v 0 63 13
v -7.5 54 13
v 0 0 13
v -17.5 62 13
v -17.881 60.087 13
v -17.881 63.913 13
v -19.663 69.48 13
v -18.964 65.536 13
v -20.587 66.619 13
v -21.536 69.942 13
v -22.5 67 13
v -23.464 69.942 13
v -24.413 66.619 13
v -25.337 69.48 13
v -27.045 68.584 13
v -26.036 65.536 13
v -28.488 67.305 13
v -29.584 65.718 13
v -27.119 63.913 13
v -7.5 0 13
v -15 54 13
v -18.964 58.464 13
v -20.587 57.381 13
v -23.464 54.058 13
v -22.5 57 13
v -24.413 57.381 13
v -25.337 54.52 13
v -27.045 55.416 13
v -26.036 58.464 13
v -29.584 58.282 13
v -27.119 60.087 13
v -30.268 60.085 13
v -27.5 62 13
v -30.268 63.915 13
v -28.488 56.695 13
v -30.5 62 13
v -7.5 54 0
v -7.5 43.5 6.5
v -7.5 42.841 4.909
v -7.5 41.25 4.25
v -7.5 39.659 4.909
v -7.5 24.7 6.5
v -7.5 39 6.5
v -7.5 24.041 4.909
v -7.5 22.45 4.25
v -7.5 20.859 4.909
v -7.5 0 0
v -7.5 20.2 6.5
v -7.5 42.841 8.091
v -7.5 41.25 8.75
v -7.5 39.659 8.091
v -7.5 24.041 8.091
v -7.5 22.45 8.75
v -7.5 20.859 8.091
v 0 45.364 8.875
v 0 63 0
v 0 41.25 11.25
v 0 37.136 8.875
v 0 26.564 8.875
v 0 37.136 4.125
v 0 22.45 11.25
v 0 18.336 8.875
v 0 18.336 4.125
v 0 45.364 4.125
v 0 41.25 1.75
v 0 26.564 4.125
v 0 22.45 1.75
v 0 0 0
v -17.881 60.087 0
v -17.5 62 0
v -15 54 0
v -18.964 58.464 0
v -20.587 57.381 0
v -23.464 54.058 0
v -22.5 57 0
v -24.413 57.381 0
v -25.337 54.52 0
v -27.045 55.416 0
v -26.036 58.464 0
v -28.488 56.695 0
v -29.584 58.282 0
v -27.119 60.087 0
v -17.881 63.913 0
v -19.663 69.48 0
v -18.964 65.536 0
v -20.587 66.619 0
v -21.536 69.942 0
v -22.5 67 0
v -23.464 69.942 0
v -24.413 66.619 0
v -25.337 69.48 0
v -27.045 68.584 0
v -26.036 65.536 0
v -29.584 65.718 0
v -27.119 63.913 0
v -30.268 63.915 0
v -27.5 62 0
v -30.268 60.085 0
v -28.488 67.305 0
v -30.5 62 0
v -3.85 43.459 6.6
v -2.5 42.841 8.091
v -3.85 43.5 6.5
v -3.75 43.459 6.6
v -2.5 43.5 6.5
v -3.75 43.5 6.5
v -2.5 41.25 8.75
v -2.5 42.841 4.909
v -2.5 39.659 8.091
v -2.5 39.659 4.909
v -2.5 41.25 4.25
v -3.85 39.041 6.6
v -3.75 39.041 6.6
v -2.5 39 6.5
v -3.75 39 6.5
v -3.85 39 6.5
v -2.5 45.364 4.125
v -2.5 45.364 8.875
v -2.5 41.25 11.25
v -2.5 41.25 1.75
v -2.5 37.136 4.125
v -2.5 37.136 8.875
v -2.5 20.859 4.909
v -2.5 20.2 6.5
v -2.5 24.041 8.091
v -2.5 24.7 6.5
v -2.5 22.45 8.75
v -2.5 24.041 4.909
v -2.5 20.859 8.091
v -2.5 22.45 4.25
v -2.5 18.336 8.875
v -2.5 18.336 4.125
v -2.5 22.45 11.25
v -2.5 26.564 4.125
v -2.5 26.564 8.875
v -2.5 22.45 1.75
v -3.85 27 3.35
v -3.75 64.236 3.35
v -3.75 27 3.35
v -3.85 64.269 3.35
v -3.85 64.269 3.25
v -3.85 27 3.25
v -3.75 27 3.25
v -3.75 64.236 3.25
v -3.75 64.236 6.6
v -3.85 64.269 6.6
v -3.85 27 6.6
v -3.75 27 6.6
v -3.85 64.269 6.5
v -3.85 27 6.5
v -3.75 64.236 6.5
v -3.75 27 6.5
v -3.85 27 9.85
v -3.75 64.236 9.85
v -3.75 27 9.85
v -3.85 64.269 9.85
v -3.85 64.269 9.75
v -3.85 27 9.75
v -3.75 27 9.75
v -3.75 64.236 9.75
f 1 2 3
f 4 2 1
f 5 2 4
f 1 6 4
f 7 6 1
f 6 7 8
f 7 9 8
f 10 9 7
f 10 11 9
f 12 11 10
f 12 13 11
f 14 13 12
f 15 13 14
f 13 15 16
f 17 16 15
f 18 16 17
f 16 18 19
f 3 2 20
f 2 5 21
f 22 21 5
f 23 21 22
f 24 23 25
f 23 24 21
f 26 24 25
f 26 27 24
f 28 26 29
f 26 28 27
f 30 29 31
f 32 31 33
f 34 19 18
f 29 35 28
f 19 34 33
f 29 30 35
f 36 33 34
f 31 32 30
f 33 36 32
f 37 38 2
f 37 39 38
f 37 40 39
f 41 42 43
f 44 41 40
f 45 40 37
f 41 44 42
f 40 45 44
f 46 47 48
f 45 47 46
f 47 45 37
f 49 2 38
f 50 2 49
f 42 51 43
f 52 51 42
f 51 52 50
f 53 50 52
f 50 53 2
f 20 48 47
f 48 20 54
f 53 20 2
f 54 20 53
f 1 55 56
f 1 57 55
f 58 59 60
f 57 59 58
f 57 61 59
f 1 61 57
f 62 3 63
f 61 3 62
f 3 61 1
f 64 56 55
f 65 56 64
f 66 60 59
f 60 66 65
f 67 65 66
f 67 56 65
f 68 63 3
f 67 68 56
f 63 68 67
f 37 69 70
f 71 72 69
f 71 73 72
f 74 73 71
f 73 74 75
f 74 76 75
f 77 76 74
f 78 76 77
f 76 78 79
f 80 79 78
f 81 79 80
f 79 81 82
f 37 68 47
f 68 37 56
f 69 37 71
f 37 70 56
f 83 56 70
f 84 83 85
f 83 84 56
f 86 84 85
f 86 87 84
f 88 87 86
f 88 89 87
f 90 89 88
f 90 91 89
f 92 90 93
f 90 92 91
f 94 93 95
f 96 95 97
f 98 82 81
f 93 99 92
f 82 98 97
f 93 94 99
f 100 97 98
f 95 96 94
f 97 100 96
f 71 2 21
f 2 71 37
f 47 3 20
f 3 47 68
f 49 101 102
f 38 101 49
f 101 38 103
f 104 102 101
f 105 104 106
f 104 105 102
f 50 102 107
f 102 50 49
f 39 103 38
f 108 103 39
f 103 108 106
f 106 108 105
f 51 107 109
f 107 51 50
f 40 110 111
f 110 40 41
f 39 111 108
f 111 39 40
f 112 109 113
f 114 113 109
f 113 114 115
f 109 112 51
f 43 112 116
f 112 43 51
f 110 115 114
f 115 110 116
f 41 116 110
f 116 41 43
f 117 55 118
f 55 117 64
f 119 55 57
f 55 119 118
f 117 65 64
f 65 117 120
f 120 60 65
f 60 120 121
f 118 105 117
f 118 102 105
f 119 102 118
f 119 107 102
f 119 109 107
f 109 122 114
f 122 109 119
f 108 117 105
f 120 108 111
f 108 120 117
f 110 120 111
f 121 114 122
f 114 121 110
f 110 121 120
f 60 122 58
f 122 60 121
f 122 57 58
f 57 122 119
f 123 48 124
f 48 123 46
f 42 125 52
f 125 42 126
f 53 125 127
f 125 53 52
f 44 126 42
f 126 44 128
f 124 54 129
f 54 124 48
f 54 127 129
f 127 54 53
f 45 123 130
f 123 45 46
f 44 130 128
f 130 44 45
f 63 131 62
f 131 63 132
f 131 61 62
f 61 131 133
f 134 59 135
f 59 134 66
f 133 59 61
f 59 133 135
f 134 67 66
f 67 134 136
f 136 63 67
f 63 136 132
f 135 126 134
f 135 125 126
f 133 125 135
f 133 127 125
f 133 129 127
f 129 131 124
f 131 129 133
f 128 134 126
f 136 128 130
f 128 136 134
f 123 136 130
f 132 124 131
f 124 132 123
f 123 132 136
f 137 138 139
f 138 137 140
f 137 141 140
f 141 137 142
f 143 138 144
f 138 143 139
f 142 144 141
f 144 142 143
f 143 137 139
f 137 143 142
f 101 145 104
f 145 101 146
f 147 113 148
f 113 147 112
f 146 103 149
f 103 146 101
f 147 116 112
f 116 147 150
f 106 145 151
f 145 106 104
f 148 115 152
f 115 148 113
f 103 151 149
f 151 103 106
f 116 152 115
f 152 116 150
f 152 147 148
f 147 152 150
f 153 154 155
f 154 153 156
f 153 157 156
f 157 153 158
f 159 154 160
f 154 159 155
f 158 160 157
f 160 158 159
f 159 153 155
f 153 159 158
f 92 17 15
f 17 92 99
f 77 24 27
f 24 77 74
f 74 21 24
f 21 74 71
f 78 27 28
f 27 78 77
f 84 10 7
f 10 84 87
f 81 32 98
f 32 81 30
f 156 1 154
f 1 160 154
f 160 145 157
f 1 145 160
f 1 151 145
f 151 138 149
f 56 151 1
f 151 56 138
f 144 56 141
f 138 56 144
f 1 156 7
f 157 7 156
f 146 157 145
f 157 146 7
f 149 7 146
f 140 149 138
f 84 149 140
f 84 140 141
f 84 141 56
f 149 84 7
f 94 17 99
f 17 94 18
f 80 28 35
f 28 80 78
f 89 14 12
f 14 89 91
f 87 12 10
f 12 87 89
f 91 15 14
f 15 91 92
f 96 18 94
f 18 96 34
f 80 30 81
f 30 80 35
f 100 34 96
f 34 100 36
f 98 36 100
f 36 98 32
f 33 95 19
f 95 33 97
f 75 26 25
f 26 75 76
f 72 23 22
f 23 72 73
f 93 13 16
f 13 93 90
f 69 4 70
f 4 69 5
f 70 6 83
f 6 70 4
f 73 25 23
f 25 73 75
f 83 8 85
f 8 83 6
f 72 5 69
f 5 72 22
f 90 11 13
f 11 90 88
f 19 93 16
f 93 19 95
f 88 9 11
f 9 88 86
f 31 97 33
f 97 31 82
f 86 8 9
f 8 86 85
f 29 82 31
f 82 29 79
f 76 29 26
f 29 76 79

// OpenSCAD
// Lower Toilet Seat Hinge Bracket
// Designed by Mike Creuzer Dec 30 2012 -  thingiverse@creuzer.com

// measurements are as the part is in use using the bottom back edge of the seat as reference for all measurements
// rotated on its side for printing when done

//Bracket bit

BracketWidth = 13; 
BracketLength = 54; 
BracketHeight = 7.5;

// Hinge upright bit to center of hinge hole
HingeWidth = BracketWidth; 
HingeLength = 9; 
HingeHeight = 15;

// Hinge Hole
//Radius
HingeHoleRadius = 5;
HingeHoleWallThickness = 3;
// Smaller number is smoother circle & slower rendering
HingeHoleRoundness = 0.01; 

//Mounting Holes
// diameter
MountingHoleSize = 4.5; 
// diameter
MountingHoleScrewHeadSize = 9.5; 
MountingHoleScrewHeadthickness = 2.5; 
FirstMountingHole = 12.75;
DistanceBetweenMountingHole =  18.8;
// smaller is more round. 6 ought to give you a pentagon
ScrewHeadRoundness = 5; 
// smaller is more round. 6 ought to give you a pentagon
ScrewRoundness = 2; 




rotate(a=[0,-90,0]){ // Rotate to the -90 so the low poly count circles put the angles up for easier printing.

// Make the mounting leg
difference(){
	cube(size = [BracketWidth,BracketLength,BracketHeight], center = false);
	// first hole
	translate(v = [BracketWidth * .5, BracketLength - FirstMountingHole, 0]) cylinder(h=BracketHeight, r=MountingHoleSize/2, $fs=ScrewRoundness);
	translate(v = [BracketWidth * .5, BracketLength - FirstMountingHole, 0]) cylinder(h=MountingHoleScrewHeadthickness, r = MountingHoleScrewHeadSize/2, $fs=ScrewHeadRoundness);
	// second hole
	translate(v = [BracketWidth * .5, BracketLength - FirstMountingHole - DistanceBetweenMountingHole, 0]) cylinder(h=BracketHeight, r=MountingHoleSize/2, $fs=ScrewRoundness);
	translate(v = [BracketWidth * .5, BracketLength - FirstMountingHole - DistanceBetweenMountingHole, 0]) cylinder(h=MountingHoleScrewHeadthickness, r = MountingHoleScrewHeadSize/2, $fs=ScrewHeadRoundness);

	// pin holes for strength
	translate(v = [BracketWidth * .25, BracketLength * .5, BracketHeight * .5]) cube(size = [.1,BracketLength,.1], center = false);
	translate(v = [BracketWidth * .5, BracketLength * .5, BracketHeight * .5]) cube(size = [.1,BracketLength,.1], center = false);
	translate(v = [BracketWidth * .75, BracketLength * .5, BracketHeight * .5]) cube(size = [.1,BracketLength,.1], center = false);
}

// Make the hinge bit
difference() { // Make the hinge bracket, then minus the hole
	hull(){ // Make the hinge bracket all fancy looking
		translate(v = [0, BracketLength, 0]) cube(size = [HingeWidth,HingeLength,HingeHeight], center = false); // The support post
		translate(v = [0, BracketLength +HingeHoleRadius + HingeHoleWallThickness, HingeHeight +BracketHeight]) rotate(a=[0,90,0]) cylinder(h = BracketWidth, r=HingeHoleRadius + HingeHoleWallThickness, center = false, $fa=HingeHoleRoundness); // The round hinge bit
	}

	// The Hinge Hole
	translate(v = [-1, BracketLength +HingeHoleRadius + HingeHoleWallThickness, HingeHeight  + BracketHeight]) rotate(a=[0,90,0]) cylinder(h = BracketWidth*2, r=HingeHoleRadius, center = false, $fa=HingeHoleRoundness); 

	// pin holes for strength
	translate(v = [BracketWidth * .25, BracketLength * .5, BracketHeight * .5]) cube(size = [.1,BracketLength,.1], center = false);
	translate(v = [BracketWidth * .5, BracketLength * .5, BracketHeight * .5]) cube(size = [.1,BracketLength,.1], center = false);
	translate(v = [BracketWidth * .75, BracketLength * .5, BracketHeight * .5]) cube(size = [.1,BracketLength,.1], center = false);
}

}
